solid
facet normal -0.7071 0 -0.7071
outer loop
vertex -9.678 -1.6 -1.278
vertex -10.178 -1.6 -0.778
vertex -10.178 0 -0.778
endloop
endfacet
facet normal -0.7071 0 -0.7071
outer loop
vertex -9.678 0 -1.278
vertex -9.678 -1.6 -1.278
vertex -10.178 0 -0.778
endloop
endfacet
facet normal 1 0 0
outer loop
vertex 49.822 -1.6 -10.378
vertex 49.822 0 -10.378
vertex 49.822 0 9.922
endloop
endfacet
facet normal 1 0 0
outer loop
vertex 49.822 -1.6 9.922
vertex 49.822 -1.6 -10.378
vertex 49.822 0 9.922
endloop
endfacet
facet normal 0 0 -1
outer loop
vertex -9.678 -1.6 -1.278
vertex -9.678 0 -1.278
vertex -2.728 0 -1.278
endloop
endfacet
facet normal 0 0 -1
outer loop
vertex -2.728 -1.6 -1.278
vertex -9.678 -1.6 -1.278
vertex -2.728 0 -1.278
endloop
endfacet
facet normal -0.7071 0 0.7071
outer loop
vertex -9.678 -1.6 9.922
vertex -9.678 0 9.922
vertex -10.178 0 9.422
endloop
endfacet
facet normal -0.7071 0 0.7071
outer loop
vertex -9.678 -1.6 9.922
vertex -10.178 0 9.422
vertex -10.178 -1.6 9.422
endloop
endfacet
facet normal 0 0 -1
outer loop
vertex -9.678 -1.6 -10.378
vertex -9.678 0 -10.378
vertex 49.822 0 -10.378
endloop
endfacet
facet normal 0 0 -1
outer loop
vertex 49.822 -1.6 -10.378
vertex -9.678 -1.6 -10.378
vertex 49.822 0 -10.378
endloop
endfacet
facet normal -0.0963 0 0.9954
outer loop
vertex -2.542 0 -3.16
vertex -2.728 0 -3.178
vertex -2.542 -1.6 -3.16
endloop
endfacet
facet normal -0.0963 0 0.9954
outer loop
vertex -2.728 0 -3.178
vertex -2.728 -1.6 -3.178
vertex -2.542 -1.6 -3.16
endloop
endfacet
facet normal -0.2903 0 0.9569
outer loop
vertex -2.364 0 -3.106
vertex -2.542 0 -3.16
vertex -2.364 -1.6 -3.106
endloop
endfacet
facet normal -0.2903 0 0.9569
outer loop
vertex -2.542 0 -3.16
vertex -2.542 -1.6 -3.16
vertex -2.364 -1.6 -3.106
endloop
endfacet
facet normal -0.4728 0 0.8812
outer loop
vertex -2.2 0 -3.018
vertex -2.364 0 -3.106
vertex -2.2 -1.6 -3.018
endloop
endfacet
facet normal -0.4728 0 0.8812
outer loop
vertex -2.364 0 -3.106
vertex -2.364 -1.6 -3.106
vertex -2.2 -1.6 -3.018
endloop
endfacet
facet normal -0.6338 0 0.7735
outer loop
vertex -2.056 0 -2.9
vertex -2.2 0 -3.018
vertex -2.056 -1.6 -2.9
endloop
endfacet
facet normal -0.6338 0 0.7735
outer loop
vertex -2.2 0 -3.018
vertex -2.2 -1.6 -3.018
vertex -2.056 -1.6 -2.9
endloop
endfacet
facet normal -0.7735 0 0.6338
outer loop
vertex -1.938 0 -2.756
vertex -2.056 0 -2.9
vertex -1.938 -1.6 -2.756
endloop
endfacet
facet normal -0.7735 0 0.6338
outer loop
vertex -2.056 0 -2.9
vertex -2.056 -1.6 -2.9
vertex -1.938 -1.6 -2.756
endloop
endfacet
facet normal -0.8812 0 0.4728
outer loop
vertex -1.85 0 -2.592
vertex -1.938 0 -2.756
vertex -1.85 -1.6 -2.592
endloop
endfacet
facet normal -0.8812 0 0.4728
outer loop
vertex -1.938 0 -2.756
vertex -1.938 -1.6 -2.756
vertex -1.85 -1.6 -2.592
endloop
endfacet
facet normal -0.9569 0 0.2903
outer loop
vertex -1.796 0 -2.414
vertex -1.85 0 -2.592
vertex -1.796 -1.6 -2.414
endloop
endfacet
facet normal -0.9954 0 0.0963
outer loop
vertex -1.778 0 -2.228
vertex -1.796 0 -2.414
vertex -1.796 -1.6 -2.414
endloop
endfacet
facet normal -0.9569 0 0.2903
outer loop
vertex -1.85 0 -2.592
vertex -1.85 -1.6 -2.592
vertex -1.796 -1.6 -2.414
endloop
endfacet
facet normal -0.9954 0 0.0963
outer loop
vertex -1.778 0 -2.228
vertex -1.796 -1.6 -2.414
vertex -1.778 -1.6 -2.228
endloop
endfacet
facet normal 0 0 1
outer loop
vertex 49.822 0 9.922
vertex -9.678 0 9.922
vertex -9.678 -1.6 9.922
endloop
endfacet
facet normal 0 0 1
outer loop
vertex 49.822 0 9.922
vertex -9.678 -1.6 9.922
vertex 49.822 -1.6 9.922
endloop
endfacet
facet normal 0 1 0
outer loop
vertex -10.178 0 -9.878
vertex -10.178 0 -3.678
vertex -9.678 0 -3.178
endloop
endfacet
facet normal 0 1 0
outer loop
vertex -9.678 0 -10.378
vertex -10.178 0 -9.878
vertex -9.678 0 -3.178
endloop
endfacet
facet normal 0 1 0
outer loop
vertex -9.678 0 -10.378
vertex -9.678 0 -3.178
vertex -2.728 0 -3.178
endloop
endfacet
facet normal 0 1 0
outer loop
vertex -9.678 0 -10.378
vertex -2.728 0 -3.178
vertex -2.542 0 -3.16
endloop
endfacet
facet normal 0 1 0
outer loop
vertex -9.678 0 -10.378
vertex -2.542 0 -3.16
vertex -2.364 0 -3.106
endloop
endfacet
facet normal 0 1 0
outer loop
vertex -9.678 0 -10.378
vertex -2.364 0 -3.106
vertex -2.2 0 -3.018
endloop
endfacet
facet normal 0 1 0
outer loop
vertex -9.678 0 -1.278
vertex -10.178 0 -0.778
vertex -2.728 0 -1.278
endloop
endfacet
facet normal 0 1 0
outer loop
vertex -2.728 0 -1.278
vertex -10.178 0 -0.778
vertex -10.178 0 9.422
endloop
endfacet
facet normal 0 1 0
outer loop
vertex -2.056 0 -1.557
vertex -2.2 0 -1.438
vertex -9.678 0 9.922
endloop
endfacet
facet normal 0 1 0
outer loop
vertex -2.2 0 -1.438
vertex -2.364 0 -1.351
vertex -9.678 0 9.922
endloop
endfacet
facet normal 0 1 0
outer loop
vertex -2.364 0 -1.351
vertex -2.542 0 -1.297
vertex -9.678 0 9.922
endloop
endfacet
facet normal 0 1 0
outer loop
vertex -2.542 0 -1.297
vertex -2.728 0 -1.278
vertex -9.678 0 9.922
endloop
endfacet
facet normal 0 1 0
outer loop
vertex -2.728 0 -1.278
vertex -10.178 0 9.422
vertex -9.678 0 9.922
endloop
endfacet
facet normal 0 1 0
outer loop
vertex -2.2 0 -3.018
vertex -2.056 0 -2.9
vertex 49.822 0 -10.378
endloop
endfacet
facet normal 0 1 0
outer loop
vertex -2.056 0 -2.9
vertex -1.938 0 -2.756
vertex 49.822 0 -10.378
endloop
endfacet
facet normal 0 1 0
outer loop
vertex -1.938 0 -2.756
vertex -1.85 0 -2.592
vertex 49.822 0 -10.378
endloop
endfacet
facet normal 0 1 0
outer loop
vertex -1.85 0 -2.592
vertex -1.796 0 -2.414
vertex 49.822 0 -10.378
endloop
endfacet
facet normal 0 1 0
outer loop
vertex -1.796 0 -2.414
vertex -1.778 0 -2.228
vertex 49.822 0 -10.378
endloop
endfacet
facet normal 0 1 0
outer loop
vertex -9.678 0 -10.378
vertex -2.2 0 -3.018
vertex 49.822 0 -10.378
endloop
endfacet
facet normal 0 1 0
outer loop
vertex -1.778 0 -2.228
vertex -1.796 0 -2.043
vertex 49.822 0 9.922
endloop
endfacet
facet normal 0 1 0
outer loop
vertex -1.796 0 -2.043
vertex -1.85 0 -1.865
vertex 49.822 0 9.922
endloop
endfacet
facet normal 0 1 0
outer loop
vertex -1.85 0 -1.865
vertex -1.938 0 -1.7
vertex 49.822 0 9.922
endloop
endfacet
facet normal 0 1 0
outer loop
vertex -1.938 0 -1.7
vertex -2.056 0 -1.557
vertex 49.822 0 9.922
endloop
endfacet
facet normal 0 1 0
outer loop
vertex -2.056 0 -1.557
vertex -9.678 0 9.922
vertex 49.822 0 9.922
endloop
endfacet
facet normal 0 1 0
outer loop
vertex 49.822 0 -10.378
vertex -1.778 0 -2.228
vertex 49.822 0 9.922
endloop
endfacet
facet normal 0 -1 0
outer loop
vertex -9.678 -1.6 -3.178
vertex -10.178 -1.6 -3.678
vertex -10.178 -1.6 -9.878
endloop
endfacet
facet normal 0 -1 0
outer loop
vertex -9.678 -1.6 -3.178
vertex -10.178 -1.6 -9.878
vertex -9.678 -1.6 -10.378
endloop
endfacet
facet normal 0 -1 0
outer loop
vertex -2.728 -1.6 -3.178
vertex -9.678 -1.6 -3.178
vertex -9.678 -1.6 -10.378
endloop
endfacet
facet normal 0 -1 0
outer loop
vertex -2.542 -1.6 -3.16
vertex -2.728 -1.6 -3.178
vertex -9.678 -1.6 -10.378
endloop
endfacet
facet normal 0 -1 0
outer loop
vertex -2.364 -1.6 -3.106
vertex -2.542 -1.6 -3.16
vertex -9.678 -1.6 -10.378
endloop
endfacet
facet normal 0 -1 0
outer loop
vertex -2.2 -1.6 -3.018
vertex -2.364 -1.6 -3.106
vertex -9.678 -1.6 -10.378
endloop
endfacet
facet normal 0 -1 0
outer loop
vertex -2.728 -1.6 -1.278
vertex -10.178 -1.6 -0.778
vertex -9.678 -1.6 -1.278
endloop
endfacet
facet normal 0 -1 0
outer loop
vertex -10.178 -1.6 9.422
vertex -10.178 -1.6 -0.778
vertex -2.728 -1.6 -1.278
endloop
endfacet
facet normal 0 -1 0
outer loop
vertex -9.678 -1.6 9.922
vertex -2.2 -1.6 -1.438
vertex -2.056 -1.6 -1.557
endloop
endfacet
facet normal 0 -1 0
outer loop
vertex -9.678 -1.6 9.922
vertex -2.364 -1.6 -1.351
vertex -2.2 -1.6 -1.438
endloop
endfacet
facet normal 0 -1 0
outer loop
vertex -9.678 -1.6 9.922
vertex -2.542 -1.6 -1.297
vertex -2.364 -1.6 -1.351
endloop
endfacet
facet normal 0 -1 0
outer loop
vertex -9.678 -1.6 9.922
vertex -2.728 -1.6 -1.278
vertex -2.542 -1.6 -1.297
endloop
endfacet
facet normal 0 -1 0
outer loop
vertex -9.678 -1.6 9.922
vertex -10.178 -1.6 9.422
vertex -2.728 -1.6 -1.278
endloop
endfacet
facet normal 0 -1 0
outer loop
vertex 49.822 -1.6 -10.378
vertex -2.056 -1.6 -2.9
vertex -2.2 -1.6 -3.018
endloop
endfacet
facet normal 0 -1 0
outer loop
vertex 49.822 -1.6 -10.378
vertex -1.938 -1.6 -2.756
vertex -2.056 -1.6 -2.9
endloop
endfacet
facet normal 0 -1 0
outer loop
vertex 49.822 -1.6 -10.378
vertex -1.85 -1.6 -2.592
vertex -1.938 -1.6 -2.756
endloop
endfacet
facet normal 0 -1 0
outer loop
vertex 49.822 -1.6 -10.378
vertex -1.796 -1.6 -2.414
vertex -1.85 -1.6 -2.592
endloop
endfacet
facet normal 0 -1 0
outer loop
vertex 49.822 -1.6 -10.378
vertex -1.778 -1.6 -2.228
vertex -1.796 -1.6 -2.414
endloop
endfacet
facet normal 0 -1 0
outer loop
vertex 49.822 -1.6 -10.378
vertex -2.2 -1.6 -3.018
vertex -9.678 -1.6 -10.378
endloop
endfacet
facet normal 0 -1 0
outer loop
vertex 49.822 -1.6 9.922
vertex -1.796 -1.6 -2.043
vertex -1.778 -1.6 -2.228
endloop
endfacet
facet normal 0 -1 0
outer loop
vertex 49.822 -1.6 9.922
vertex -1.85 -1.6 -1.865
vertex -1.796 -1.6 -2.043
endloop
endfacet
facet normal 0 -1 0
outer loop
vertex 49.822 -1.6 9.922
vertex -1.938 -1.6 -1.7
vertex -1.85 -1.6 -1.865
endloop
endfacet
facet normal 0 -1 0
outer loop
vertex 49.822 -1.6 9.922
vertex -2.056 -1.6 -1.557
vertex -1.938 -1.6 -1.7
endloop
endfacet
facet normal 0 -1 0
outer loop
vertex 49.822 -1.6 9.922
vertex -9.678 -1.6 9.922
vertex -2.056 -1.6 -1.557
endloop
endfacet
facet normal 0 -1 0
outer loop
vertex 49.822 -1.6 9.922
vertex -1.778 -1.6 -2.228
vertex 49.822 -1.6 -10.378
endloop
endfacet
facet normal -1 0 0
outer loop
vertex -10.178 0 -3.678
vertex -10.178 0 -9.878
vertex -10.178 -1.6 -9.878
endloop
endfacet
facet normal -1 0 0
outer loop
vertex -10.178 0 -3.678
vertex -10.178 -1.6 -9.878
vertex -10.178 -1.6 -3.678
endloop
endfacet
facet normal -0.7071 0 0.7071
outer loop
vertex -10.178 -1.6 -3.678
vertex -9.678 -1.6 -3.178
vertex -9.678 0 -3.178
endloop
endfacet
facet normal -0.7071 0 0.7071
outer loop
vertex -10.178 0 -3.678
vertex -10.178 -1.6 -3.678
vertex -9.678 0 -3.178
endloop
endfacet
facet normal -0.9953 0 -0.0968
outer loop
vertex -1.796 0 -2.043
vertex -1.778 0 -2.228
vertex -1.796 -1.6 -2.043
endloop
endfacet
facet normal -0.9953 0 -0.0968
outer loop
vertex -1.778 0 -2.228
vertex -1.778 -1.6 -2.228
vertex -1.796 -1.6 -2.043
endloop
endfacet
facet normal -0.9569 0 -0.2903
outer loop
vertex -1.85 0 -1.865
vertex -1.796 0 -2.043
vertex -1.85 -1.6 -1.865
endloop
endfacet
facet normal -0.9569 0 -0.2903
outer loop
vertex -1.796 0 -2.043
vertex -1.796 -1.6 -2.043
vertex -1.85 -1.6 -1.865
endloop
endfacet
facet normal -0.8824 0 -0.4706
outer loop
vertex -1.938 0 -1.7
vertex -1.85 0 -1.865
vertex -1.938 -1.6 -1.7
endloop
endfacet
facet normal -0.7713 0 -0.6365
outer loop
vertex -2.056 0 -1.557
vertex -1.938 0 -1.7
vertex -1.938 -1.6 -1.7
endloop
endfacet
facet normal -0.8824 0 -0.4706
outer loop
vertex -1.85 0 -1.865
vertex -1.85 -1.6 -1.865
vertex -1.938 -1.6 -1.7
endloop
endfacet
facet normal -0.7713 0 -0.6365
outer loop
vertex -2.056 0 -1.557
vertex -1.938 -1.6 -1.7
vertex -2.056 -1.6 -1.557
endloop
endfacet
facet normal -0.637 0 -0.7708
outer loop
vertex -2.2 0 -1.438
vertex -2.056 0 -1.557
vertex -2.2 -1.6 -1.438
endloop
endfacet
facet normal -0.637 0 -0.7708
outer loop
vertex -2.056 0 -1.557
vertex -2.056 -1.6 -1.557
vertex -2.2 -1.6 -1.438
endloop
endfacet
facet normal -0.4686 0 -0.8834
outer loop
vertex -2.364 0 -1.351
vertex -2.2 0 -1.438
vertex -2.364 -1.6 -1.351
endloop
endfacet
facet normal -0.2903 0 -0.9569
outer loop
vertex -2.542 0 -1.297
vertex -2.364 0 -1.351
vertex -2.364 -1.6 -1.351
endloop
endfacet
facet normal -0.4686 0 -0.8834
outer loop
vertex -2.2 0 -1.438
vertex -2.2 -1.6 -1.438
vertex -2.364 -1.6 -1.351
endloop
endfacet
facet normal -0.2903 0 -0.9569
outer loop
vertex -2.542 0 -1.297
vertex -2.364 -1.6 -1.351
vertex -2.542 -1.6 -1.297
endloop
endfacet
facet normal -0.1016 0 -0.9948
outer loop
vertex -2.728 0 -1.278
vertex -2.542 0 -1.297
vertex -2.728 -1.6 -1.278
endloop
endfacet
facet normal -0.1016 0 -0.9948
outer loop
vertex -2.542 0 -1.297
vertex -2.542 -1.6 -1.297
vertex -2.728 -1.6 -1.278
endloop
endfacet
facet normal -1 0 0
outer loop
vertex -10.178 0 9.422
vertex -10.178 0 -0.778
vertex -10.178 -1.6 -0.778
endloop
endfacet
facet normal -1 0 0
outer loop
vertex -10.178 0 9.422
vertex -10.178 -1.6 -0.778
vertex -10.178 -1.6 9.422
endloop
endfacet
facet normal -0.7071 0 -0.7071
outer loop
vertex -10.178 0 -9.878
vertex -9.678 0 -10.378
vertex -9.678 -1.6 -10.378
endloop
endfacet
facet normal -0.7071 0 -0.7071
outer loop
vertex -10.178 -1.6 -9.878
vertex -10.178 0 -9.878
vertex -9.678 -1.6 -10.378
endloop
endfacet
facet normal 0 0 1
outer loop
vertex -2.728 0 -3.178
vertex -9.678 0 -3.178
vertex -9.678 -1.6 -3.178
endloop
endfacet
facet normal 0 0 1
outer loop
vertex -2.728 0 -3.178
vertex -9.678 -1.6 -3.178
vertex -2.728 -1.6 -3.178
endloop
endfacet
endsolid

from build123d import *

# Parameters (mm, degrees)
F0_W     = 60
F0_H     = 20.3
F1_DEPTH = 1.6
F2_W     = 10
F2_H     = 1.9
F3_DEPTH = 25
F4_SIZE  = 0.5
F5_R     = 0.94999


# Not quite as in the source:
# - a fillet or chamfer is up to 0.001 mm smaller than in the source, because OpenCascade refuses the exact size


with BuildPart() as f1:
    # F0 (on Front) → F1 (new body)
    with BuildSketch(Plane.XZ):
        with Locations((19.8222492922, -0.2282736823)):
            Rectangle(F0_W, F0_H)
    extrude(amount=F1_DEPTH)

    # F2 (on Front) → F3 (cut)
    with BuildSketch(Plane.XZ):
        with Locations((-6.7777507078, -2.2282736823)):
            Rectangle(F2_W, F2_H)
    extrude(amount=F3_DEPTH, mode=Mode.SUBTRACT)

    # F4
    f4_edges = [f1.edges().sort_by_distance(p)[0] for p in [
        (-10.177751, -0.8, 9.921726),
        (-10.177751, -0.8, -1.278274),
        (-10.177751, -0.8, -3.178274),
        (-10.177751, -0.8, -10.378274),
    ]]
    chamfer(f4_edges, length=F4_SIZE)

    # F5 (radius 0.95 in the source; OpenCascade refuses exactly that, so slightly less here)
    f5_edges = [f1.edges().sort_by_distance(p)[0] for p in [
        (-1.777751, -0.8, -1.278274),
        (-1.777751, -0.8, -3.178274),
    ]]
    fillet(f5_edges, radius=F5_R)


solid = f1.part
